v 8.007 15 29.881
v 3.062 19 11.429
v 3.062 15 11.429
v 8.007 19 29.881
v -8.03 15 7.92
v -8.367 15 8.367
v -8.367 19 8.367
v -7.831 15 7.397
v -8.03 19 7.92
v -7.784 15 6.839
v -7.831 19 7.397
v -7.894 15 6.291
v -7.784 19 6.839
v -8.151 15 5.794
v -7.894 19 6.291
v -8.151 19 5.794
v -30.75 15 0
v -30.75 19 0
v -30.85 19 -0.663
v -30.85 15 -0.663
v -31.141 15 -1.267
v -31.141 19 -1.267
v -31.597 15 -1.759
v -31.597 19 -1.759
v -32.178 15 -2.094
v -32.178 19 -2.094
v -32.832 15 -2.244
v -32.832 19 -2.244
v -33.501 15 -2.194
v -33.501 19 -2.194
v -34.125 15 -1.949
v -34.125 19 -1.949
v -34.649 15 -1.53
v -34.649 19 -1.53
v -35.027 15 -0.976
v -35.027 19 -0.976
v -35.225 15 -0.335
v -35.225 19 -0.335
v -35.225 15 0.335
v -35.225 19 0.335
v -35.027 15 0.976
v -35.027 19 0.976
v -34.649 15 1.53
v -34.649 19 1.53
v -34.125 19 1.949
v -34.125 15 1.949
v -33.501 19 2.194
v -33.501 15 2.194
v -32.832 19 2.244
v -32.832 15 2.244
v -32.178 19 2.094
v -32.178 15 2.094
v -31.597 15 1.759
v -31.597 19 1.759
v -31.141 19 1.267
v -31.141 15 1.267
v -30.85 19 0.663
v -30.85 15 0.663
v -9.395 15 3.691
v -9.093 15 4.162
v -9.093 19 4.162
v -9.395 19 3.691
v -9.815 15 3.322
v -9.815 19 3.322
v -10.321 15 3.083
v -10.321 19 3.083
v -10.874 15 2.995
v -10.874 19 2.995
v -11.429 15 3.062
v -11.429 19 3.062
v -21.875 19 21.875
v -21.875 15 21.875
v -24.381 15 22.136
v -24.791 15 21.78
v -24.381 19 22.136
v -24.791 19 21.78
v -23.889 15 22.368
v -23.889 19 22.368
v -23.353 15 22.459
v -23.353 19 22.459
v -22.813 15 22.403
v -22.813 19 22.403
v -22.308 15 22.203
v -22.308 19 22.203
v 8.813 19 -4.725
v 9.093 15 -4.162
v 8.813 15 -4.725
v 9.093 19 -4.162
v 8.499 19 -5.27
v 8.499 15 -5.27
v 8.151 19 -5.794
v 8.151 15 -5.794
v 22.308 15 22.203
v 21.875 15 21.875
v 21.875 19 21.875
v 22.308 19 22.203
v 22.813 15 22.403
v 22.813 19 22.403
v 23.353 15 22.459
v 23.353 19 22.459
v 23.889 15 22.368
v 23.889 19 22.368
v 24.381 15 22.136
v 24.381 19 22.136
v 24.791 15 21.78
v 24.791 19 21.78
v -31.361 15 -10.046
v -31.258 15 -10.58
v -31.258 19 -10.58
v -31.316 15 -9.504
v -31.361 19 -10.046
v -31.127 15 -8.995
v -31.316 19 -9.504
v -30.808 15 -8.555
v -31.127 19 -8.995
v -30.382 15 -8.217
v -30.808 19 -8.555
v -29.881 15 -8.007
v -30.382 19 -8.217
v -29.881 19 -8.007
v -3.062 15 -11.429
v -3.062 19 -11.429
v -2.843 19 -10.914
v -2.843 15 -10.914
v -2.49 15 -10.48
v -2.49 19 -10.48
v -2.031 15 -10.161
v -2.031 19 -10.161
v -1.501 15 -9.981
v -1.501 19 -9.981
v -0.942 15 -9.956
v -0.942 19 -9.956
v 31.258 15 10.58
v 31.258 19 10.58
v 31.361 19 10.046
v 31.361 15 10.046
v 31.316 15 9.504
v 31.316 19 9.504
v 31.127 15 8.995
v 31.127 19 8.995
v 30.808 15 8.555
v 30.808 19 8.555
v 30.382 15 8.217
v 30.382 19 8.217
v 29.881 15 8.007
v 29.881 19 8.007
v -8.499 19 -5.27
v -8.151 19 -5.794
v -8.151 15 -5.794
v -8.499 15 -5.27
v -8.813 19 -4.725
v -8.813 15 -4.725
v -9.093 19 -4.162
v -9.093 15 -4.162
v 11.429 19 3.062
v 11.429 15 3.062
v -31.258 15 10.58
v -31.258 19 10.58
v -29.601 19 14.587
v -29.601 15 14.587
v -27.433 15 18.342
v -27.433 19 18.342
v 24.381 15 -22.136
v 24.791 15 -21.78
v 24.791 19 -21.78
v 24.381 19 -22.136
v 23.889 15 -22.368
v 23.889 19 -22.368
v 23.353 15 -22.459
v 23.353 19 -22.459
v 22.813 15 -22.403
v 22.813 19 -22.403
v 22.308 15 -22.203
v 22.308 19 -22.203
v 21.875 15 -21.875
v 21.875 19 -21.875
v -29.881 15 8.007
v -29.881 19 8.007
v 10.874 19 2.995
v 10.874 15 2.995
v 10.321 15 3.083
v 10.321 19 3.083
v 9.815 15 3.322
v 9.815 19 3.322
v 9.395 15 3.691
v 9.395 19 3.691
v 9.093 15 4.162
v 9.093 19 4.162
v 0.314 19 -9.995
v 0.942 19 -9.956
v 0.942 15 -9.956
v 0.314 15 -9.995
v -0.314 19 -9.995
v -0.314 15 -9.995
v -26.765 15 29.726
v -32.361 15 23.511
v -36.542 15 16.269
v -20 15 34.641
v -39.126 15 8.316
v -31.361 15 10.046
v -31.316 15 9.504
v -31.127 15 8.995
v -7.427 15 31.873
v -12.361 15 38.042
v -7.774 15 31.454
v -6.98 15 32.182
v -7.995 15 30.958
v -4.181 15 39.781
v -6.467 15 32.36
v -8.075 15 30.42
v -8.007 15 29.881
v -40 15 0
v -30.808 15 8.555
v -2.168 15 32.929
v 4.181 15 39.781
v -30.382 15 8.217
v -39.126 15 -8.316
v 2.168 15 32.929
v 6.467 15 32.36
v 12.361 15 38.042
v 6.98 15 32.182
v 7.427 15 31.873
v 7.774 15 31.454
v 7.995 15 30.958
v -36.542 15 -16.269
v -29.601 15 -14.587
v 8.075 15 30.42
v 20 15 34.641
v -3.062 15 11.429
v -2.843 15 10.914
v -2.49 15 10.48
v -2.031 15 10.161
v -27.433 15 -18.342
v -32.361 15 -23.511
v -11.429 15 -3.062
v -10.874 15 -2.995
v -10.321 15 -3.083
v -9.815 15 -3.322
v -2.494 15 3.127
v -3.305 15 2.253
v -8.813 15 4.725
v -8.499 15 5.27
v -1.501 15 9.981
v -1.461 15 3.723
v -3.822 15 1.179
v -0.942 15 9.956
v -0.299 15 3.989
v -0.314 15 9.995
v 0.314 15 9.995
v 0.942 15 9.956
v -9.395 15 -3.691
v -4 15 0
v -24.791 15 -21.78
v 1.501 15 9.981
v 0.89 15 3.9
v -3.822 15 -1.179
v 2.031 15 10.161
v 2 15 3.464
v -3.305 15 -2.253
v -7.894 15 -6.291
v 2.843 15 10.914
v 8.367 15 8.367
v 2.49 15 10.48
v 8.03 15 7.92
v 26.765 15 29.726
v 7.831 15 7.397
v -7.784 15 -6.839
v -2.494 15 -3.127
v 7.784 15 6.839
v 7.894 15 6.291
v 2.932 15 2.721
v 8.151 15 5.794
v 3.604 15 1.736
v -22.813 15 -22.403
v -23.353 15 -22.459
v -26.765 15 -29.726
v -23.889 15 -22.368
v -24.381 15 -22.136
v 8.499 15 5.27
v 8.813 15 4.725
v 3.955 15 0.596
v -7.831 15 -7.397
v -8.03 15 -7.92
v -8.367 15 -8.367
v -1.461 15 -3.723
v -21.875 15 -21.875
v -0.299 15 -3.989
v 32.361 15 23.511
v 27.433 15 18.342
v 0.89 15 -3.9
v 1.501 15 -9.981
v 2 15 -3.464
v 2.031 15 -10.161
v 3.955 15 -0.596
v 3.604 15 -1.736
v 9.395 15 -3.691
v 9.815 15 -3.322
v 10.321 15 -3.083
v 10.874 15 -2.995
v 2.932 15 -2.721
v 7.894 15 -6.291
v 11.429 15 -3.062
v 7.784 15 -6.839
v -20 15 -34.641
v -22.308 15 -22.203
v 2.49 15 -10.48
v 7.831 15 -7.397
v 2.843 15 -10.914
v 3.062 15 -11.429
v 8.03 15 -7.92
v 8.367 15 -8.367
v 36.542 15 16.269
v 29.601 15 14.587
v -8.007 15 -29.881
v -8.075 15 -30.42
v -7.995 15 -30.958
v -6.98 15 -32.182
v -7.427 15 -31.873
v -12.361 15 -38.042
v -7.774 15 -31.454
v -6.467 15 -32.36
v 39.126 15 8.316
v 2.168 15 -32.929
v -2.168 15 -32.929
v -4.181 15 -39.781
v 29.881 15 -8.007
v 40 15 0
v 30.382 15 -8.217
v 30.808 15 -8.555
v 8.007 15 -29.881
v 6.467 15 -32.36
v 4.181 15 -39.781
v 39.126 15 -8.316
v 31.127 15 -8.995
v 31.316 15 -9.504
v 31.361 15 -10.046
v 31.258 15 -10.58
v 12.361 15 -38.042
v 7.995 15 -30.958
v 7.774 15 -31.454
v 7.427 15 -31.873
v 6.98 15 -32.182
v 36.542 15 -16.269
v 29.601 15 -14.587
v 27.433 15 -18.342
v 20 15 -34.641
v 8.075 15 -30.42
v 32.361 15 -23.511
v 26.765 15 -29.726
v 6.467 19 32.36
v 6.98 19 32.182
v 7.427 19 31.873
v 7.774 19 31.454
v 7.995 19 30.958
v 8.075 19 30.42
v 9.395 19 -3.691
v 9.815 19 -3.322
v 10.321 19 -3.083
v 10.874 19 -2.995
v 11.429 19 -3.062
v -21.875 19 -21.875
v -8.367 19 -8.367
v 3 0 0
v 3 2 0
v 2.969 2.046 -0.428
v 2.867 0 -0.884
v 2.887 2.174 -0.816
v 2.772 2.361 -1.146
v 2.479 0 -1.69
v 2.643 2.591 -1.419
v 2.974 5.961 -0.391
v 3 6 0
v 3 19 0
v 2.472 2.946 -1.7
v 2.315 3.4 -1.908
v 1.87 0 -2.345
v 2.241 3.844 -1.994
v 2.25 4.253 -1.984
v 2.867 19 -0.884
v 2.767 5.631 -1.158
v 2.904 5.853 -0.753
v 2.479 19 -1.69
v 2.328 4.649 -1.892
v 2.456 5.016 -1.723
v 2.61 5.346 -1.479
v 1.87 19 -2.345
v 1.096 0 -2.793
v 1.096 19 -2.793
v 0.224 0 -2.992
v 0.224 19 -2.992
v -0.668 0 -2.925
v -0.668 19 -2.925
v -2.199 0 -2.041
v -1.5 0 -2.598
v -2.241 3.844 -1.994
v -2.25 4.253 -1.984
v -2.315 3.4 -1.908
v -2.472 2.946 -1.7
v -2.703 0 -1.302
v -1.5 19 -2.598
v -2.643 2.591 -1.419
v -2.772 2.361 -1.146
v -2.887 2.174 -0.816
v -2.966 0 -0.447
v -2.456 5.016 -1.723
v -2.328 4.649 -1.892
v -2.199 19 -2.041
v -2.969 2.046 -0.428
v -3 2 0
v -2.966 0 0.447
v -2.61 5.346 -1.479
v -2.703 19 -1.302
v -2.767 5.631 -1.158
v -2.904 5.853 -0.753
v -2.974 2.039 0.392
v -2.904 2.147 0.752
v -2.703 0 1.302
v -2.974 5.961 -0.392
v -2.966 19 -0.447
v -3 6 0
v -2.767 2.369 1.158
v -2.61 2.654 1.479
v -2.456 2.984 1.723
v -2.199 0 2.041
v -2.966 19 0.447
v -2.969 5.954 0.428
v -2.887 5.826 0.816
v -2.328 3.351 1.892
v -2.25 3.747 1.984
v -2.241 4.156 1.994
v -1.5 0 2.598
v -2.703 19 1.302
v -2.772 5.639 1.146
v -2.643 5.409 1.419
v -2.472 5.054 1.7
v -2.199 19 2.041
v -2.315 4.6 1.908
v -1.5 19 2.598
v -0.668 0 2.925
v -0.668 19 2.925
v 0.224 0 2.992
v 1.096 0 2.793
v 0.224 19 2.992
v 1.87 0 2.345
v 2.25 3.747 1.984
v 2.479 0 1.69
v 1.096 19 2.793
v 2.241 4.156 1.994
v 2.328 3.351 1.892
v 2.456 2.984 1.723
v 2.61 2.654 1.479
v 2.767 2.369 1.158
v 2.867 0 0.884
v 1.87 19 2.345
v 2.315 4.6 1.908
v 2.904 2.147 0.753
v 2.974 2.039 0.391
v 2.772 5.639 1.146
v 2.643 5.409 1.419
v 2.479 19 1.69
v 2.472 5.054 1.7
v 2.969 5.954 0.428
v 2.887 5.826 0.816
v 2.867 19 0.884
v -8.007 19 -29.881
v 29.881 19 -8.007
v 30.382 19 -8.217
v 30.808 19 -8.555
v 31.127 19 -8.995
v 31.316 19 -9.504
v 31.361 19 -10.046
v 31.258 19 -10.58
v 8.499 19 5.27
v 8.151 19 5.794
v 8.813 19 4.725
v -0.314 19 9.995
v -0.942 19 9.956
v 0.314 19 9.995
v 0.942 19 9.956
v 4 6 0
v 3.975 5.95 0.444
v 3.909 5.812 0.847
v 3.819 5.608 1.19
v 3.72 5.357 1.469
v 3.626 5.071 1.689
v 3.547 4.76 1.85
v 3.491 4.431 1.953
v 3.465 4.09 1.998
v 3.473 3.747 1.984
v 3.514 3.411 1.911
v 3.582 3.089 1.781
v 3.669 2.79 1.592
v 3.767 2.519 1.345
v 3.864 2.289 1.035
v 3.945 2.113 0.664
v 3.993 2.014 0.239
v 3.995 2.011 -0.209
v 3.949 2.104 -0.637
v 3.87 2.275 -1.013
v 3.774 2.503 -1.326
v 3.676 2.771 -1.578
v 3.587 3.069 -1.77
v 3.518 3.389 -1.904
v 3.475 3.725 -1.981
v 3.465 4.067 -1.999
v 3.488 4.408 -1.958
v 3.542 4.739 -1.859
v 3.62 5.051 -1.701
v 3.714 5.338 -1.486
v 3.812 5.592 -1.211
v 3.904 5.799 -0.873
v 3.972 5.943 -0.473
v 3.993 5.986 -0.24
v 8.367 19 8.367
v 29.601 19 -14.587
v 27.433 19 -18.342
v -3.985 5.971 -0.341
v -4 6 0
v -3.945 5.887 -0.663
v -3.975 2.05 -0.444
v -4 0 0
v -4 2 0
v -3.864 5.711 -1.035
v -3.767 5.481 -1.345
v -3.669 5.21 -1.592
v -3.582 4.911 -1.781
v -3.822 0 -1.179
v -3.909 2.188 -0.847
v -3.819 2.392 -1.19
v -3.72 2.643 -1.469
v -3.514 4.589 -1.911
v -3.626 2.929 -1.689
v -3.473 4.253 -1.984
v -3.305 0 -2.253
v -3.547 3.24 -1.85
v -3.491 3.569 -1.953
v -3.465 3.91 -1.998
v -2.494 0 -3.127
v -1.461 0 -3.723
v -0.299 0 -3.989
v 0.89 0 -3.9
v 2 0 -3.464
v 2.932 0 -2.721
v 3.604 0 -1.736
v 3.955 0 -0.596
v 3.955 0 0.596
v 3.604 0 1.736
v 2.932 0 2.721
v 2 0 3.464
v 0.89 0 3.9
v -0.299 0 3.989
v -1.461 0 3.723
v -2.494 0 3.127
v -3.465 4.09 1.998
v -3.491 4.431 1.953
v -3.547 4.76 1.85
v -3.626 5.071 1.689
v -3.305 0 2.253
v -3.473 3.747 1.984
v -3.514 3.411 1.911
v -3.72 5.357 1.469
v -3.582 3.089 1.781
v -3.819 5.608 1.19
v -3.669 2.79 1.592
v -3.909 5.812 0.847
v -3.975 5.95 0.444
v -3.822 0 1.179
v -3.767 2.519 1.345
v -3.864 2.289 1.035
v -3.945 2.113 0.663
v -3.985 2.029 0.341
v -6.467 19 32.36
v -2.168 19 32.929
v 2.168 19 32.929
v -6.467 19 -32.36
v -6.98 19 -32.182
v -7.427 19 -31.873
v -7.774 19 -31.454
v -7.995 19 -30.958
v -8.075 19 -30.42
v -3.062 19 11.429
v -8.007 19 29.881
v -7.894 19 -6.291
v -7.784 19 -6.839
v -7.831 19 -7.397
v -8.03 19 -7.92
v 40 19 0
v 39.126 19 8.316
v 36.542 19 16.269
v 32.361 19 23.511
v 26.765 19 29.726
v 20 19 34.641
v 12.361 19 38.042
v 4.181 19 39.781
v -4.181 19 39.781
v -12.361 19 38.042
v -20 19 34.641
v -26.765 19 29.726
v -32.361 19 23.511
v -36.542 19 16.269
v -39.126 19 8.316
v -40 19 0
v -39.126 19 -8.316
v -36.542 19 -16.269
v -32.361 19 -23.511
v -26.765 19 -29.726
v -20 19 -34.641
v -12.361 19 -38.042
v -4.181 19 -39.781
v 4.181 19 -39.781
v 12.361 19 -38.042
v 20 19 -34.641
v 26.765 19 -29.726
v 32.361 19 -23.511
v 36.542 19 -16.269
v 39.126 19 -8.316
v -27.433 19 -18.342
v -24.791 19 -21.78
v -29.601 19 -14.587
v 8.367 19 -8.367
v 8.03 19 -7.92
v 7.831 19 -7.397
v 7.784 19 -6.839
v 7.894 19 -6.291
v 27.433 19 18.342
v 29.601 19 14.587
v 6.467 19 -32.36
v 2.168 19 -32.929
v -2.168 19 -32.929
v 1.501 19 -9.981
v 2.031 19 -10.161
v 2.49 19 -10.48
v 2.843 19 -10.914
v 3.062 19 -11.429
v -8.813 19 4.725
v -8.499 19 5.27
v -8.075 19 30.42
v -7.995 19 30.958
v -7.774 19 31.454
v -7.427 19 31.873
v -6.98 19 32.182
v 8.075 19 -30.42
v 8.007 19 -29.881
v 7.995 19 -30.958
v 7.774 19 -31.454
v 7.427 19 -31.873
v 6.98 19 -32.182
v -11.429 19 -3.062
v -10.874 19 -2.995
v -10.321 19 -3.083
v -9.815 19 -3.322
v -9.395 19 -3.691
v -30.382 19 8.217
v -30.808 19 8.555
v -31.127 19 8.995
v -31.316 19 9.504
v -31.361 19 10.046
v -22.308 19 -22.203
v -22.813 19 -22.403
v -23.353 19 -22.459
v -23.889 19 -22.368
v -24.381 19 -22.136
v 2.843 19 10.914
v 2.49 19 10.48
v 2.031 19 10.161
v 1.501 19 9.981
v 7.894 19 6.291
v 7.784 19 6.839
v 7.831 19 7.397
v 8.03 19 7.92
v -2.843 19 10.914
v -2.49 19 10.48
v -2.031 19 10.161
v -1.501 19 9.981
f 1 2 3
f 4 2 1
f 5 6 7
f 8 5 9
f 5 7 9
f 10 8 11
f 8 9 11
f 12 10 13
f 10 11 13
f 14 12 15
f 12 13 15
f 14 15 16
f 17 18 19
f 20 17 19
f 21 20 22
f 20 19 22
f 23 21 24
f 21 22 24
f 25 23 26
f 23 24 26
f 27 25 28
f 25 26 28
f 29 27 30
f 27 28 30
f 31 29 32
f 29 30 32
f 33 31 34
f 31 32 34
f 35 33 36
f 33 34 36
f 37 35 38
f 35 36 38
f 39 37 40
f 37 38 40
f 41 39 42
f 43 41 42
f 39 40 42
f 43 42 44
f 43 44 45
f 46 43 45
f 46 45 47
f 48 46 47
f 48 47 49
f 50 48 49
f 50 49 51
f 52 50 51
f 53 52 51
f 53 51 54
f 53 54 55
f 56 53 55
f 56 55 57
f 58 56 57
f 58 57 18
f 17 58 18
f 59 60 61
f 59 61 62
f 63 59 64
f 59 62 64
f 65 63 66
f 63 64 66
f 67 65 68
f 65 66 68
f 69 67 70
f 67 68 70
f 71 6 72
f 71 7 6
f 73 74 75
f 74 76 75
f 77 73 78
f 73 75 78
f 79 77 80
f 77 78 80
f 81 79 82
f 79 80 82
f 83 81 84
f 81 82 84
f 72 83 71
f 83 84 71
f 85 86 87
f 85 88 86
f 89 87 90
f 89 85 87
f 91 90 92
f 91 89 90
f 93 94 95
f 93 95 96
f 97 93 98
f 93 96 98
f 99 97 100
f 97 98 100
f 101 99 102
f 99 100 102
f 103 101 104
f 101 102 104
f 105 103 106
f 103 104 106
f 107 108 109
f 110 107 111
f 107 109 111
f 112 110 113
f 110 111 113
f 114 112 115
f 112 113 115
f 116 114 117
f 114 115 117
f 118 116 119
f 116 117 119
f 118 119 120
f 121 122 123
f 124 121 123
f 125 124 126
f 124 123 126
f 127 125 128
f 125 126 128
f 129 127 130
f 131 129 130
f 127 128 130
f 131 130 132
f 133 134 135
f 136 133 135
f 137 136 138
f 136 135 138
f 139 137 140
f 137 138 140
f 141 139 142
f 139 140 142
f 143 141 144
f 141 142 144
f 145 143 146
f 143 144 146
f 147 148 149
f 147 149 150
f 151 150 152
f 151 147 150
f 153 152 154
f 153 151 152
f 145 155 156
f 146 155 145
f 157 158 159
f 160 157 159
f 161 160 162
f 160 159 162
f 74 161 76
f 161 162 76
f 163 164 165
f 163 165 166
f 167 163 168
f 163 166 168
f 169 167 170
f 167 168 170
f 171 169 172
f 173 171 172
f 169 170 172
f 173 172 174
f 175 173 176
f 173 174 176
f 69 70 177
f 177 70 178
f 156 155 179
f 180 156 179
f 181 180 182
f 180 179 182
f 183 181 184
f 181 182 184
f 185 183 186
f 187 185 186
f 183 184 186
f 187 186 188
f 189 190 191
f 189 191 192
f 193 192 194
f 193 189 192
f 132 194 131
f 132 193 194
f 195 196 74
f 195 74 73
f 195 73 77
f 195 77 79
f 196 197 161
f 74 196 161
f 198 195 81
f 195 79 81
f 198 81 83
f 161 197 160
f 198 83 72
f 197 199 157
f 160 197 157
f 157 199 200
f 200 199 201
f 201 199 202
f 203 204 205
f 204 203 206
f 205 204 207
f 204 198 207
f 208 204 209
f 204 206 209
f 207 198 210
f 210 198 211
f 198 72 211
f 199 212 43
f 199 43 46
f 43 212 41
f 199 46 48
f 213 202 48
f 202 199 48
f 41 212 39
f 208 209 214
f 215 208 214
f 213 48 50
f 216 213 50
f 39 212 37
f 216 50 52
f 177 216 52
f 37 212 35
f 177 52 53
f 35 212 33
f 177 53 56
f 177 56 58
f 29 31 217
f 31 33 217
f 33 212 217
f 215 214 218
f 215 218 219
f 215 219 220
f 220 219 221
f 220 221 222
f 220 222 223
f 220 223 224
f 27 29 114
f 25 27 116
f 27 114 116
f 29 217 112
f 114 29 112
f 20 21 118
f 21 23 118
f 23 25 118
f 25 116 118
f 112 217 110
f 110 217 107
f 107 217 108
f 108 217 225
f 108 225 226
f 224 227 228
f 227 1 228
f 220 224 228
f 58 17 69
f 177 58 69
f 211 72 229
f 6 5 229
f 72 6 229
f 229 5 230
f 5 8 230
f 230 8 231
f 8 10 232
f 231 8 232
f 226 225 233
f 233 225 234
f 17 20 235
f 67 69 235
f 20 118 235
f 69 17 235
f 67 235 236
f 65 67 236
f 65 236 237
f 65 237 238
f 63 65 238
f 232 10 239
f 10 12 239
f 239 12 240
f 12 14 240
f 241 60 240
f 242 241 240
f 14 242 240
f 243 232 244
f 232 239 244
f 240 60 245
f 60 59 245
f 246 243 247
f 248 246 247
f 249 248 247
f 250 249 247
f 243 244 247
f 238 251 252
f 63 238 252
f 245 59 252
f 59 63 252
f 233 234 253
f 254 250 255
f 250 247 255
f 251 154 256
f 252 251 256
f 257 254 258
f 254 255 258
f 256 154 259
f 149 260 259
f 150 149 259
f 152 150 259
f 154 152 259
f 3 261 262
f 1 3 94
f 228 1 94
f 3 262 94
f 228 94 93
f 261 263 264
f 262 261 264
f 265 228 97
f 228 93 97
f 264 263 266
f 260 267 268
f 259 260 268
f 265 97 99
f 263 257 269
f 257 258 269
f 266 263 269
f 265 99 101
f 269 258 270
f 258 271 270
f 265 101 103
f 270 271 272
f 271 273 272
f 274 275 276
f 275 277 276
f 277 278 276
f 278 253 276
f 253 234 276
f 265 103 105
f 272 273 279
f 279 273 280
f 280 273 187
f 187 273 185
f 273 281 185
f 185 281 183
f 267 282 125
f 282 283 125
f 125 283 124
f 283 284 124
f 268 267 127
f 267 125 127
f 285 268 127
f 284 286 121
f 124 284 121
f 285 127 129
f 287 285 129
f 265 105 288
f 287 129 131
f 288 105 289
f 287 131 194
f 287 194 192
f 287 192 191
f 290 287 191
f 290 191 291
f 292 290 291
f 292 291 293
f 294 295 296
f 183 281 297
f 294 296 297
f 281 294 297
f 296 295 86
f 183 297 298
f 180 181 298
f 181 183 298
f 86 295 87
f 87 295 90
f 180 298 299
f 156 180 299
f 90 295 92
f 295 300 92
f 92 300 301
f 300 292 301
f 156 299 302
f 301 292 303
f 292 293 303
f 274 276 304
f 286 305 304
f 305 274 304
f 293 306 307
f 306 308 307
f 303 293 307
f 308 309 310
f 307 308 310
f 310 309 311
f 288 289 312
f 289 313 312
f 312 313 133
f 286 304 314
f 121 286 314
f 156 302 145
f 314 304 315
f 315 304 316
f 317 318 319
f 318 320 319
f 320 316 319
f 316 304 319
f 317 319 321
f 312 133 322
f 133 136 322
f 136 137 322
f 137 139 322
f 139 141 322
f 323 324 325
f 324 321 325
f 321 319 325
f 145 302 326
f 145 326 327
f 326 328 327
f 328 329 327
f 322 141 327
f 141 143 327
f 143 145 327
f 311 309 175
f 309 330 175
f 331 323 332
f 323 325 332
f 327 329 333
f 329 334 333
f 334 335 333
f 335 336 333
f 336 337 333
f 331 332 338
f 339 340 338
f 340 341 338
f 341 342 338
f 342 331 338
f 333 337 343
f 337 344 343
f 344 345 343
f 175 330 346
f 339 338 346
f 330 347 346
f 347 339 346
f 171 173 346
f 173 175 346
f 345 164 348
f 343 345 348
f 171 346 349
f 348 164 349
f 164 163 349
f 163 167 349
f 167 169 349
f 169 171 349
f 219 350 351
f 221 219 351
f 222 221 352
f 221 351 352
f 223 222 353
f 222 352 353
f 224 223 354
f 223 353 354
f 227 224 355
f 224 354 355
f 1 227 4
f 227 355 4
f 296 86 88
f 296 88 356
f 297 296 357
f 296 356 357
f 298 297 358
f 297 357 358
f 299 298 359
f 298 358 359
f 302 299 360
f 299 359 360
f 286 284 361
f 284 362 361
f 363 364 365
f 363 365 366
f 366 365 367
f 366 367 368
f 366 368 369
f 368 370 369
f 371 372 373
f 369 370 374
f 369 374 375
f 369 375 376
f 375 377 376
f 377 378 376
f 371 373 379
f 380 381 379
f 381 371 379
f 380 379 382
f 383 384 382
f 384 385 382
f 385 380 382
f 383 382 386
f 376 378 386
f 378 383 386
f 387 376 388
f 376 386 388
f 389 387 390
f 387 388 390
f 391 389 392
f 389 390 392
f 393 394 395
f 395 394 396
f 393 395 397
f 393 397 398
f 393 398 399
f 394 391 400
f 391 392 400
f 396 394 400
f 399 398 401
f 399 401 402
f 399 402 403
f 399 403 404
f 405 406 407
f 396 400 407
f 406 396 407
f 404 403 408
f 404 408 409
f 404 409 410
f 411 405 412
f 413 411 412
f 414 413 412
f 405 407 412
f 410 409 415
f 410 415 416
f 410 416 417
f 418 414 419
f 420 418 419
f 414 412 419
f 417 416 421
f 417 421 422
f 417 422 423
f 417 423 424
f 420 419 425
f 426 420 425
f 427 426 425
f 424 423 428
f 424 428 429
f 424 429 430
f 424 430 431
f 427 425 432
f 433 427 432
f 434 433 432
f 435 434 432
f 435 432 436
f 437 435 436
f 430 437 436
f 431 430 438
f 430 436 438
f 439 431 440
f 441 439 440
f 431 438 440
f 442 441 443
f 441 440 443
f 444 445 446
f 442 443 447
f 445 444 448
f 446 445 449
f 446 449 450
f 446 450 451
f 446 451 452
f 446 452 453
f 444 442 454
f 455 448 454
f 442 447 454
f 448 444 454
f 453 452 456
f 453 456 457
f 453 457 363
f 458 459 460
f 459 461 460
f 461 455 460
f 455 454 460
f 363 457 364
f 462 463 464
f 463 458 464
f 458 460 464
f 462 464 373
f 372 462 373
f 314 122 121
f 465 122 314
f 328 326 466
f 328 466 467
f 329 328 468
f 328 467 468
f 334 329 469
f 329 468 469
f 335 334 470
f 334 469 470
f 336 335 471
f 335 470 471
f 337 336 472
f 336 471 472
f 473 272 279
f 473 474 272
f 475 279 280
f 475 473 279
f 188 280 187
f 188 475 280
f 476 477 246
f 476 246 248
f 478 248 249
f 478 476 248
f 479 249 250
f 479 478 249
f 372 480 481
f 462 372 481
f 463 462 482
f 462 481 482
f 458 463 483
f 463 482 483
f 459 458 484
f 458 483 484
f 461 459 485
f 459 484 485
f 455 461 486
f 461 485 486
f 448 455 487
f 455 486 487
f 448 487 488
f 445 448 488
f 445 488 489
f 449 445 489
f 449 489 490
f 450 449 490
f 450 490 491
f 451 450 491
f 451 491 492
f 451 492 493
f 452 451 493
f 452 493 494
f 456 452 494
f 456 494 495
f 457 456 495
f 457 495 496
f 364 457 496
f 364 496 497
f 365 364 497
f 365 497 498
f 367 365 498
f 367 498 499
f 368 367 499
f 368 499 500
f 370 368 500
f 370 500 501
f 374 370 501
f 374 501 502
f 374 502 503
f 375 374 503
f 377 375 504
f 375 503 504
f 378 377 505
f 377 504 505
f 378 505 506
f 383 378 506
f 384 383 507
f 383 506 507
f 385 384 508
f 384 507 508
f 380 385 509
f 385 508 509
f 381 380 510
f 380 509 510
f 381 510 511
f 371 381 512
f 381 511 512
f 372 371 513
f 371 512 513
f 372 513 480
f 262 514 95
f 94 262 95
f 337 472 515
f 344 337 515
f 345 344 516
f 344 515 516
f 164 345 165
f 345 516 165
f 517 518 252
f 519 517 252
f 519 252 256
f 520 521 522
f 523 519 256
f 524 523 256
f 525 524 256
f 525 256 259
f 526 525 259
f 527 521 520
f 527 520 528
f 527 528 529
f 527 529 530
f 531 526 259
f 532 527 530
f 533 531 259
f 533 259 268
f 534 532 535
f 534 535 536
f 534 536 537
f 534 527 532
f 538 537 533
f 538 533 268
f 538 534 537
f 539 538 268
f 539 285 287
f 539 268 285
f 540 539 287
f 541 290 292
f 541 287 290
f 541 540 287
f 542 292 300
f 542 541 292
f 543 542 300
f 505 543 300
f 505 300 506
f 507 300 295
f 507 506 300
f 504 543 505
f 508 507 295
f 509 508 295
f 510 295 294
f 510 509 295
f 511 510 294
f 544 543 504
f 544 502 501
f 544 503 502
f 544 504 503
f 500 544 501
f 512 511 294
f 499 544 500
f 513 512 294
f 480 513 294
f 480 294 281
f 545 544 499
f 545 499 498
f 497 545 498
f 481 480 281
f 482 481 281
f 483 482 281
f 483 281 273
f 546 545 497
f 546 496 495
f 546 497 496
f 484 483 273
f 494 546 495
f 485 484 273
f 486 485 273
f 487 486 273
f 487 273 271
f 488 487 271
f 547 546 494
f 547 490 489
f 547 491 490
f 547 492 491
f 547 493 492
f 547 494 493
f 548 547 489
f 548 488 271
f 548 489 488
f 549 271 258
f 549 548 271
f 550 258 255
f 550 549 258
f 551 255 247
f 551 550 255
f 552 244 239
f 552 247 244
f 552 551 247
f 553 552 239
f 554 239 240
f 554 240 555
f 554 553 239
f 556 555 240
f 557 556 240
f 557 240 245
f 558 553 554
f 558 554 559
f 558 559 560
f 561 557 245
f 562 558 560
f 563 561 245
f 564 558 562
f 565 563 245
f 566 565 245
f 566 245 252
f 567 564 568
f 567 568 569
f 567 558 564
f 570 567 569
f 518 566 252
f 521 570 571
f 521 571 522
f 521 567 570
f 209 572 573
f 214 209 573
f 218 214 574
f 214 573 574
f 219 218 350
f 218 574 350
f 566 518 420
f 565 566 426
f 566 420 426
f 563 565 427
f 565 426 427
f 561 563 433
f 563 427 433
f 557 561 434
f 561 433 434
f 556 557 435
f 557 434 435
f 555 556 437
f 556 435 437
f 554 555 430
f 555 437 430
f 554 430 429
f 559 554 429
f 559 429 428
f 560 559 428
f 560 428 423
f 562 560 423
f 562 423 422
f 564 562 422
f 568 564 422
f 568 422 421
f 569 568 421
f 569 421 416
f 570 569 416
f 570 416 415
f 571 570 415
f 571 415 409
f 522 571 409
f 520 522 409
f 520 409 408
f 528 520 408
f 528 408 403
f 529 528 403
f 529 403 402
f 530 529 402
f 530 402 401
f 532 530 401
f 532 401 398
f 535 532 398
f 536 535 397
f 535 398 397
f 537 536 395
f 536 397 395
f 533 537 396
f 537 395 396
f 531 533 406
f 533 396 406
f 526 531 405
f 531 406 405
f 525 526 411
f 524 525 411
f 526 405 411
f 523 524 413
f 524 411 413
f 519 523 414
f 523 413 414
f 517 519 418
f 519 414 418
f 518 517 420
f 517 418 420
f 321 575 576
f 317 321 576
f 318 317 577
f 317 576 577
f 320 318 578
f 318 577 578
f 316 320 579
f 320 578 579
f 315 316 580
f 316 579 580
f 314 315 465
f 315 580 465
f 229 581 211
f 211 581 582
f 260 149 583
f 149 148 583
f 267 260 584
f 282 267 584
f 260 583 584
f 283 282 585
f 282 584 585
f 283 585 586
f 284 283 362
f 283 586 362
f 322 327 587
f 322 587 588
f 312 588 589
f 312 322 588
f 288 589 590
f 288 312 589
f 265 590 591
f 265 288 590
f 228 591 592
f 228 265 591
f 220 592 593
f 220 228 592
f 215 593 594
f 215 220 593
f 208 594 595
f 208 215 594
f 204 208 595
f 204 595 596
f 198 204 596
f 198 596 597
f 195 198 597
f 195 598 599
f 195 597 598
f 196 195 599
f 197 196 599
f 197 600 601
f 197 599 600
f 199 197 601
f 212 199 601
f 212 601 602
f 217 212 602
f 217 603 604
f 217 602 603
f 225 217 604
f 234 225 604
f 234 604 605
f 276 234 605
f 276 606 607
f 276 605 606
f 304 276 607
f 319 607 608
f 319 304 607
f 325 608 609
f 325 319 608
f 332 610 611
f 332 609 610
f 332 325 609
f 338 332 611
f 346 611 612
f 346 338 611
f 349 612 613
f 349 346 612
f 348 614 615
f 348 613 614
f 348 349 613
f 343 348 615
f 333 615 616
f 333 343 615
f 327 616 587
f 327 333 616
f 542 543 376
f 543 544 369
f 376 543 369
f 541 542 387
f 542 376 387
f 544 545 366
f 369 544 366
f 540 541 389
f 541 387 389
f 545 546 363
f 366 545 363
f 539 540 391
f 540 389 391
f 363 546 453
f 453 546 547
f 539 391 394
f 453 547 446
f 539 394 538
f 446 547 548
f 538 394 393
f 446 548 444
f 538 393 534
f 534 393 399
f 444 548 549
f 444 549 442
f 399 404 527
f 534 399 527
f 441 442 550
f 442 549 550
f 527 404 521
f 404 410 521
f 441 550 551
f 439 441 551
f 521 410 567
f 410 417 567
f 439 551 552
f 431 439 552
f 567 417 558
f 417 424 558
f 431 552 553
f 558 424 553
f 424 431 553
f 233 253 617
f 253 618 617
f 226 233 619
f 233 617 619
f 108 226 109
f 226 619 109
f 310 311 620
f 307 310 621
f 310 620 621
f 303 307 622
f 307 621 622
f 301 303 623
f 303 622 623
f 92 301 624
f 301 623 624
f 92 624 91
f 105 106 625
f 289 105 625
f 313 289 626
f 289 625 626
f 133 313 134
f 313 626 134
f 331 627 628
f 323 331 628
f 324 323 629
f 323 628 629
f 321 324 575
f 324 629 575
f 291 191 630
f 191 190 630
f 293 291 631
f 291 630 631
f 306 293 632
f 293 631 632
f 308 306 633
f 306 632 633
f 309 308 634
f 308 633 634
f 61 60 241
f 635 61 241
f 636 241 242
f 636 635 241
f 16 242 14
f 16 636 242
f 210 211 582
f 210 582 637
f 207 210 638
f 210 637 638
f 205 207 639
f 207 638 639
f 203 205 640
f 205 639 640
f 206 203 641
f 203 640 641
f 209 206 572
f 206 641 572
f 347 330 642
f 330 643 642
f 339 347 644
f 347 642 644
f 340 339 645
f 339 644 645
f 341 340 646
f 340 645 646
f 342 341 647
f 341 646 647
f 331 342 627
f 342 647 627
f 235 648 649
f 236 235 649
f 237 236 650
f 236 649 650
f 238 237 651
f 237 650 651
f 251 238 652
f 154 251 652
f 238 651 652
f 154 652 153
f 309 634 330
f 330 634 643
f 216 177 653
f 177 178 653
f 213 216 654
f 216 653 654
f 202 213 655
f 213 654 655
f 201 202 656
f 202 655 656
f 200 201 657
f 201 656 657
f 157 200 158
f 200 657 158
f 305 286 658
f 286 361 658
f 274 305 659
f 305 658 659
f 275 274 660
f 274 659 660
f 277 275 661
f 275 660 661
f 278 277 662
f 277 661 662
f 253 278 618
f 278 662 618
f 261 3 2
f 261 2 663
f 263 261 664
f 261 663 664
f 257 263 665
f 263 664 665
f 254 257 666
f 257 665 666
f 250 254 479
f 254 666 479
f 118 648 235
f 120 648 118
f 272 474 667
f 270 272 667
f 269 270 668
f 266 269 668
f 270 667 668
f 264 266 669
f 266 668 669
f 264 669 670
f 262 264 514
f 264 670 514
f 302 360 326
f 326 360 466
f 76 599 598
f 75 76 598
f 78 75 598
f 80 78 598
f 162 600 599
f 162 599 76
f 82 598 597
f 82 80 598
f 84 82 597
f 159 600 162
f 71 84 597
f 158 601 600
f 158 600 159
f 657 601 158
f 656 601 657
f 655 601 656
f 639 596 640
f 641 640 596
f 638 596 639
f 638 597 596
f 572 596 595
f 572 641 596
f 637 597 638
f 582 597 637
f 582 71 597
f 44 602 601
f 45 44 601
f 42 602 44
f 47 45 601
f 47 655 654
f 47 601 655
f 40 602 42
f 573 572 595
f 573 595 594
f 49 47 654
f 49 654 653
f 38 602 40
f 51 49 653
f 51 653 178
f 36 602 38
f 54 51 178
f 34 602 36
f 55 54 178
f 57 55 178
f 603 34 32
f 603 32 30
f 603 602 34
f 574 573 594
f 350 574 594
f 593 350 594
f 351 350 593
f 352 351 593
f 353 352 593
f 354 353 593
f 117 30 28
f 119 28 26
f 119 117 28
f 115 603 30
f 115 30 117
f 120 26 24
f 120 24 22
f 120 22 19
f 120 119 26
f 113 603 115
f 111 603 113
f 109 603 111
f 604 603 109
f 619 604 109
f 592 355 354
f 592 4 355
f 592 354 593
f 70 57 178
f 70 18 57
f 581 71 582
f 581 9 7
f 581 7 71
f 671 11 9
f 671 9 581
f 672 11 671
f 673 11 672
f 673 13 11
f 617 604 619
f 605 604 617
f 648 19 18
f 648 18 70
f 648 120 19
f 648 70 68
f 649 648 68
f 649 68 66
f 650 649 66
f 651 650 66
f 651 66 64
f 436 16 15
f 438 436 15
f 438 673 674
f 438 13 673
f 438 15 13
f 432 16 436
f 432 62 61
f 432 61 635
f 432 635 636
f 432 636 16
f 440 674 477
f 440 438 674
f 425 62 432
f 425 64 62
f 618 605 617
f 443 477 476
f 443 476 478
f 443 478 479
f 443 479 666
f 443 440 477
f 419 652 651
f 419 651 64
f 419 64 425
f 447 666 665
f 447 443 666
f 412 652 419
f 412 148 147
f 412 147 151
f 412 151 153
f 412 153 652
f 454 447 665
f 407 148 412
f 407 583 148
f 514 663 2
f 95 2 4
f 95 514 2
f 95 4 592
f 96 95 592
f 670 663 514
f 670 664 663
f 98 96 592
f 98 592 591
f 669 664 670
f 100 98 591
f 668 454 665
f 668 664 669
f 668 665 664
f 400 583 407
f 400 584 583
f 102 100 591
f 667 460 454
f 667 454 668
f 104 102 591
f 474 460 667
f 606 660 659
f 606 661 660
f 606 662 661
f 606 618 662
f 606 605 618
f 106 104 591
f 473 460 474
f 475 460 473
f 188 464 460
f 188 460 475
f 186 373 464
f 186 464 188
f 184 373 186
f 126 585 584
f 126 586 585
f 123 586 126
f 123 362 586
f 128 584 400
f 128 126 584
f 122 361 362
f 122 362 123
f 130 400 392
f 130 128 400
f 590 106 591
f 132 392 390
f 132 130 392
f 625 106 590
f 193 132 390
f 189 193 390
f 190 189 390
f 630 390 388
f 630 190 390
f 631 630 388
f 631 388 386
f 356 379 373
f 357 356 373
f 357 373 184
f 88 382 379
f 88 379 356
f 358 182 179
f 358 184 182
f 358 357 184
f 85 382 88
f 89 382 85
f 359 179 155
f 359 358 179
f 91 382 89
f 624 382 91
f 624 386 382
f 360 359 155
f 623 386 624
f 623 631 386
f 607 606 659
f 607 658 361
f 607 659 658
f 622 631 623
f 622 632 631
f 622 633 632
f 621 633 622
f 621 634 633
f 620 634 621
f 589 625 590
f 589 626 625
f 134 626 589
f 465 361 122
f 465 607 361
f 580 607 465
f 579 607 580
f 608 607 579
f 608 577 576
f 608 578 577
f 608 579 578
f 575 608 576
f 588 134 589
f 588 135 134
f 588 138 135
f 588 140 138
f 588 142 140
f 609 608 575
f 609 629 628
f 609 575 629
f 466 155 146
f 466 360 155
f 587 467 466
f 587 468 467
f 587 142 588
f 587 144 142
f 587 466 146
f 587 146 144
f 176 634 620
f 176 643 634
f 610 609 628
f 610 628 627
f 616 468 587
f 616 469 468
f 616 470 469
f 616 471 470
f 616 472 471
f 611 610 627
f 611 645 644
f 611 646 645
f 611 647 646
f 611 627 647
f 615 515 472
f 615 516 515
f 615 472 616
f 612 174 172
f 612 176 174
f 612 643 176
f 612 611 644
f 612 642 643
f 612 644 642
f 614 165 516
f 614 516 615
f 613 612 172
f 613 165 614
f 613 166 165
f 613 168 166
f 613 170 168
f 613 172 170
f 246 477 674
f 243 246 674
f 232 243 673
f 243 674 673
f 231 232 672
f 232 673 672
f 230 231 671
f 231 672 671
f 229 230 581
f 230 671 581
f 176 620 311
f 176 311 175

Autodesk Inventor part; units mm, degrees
ref_plane "YZ Plane" through (0, 0, 0) normal (1, 0, 0) x (0, 1, 0)
ref_plane "XZ Plane" through (0, 0, 0) normal (0, 1, 0) x (-1, 0, 0)
ref_plane "XY Plane" through (0, 0, 0) normal (0, 0, 1) x (1, 0, 0)
sketch "Sketch1" plane through (0, 0, 0) normal (0, 1, 0) x (-1, 0, 0)
  circle A0 centre (0, 0) radius 4
  dimension "d0" = 8
extrude "Extrusion1" add sketch "Sketch1" along normal blind 15
sketch "Sketch2" plane through (0, 15, 0) normal (0, 1, 0) x (1, 0, 0)
  circle A0 centre (0, 0) radius 3
  dimension "d3" = 6
extrude "Extrusion2" cut sketch "Sketch2" against normal blind 13
sketch "Sketch3" plane through (0, 0, 0) normal (1, 0, 0) x (0, 1, 0)
  line L0 (15, -4) -> (15, 4) projected
  circle A0 centre (4, 0) radius 2
  line L1 (0, -4) -> (0, 4) projected
  point P0 (0, 0)
  dimension "d8" = 4
  dimension "d9" = 4
extrude "Extrusion3" cut sketch "Sketch3" against normal through all both and the other way through all
sketch "Sketch9" plane through (0, 15, 0) normal (0, 1, 0) x (1, 0, 0)
  circle A0 centre (0, 0) radius 40
  dimension "d47" = 80
extrude "Extrusion8" add sketch "Sketch9" along normal blind 4
sketch "Sketch10" plane through (0, 19, 0) normal (0, 1, 0) x (1, 0, 0)
  circle A0 centre (0, 0) radius 3
  circle A1 centre (-33, 0) radius 2.25
  arc A2 (3, 0) -> (-3, 0) centre (0, 0) ccw projected
  line L0 (0, 0) -> (-40, 0)
  circle A3 centre (0, 0) radius 4 projected
  arc A4 (-31.2581, -10.5797) -> (-24.7914, -21.7805) centre (0, 0) ccw
  arc A5 (-29.8813, -8.0067) -> (-31.2581, -10.5797) centre (-29.3637, -9.9385) ccw
  arc A6 (-24.7914, -21.7805) -> (-21.8746, -21.8746) centre (-23.2889, -20.4604) ccw
  arc A7 (-9.0928, -4.1619) -> (-8.1507, -5.7937) centre (0, 0) ccw
  line L1 (-8.3666, -8.3666) -> (-21.8746, -21.8746)
  line L2 (-11.429, -3.0624) -> (-29.8813, -8.0067)
  arc A8 (-8.3666, -8.3666) -> (-8.1507, -5.7937) centre (-9.7808, -6.9524) ccw
  arc A9 (-9.0928, -4.1619) -> (-11.429, -3.0624) centre (-10.9114, -4.9942) ccw
  arc A10 (-6.4667, -32.3602) -> (6.4667, -32.3602) centre (0, 0) ccw
  line L3 (-3.0624, -11.429) -> (-8.0067, -29.8813)
  arc A11 (-0.9421, -9.9555) -> (-3.0624, -11.429) centre (-1.1305, -11.9466) ccw
  line L4 (3.0624, -11.429) -> (8.0067, -29.8813)
  arc A12 (-0.9421, -9.9555) -> (0.9421, -9.9555) centre (0, 0) ccw
  arc A13 (3.0624, -11.429) -> (0.9421, -9.9555) centre (1.1305, -11.9466) ccw
  arc A14 (6.4667, -32.3602) -> (8.0067, -29.8813) centre (6.0748, -30.399) ccw
  arc A15 (-8.0067, -29.8813) -> (-6.4667, -32.3602) centre (-6.0748, -30.399) ccw
  arc A16 (24.7914, -21.7805) -> (31.2581, -10.5797) centre (0, 0) ccw
  line L5 (8.3666, -8.3666) -> (21.8746, -21.8746)
  arc A17 (8.1507, -5.7937) -> (8.3666, -8.3666) centre (9.7808, -6.9524) ccw
  line L6 (11.429, -3.0624) -> (29.8813, -8.0067)
  arc A18 (8.1507, -5.7937) -> (9.0928, -4.1619) centre (0, 0) ccw
  arc A19 (11.429, -3.0624) -> (9.0928, -4.1619) centre (10.9114, -4.9942) ccw
  arc A20 (31.2581, -10.5797) -> (29.8813, -8.0067) centre (29.3637, -9.9385) ccw
  arc A21 (21.8746, -21.8746) -> (24.7914, -21.7805) centre (23.2889, -20.4604) ccw
  arc A22 (31.2581, 10.5797) -> (24.7914, 21.7805) centre (0, 0) ccw
  line L7 (11.429, 3.0624) -> (29.8813, 8.0067)
  arc A23 (9.0928, 4.1619) -> (11.429, 3.0624) centre (10.9114, 4.9942) ccw
  line L8 (8.3666, 8.3666) -> (21.8746, 21.8746)
  arc A24 (9.0928, 4.1619) -> (8.1507, 5.7937) centre (0, 0) ccw
  arc A25 (8.3666, 8.3666) -> (8.1507, 5.7937) centre (9.7808, 6.9524) ccw
  arc A26 (24.7914, 21.7805) -> (21.8746, 21.8746) centre (23.2889, 20.4604) ccw
  arc A27 (29.8813, 8.0067) -> (31.2581, 10.5797) centre (29.3637, 9.9385) ccw
  arc A28 (6.4667, 32.3602) -> (-6.4667, 32.3602) centre (0, 0) ccw
  line L9 (3.0624, 11.429) -> (8.0067, 29.8813)
  arc A29 (0.9421, 9.9555) -> (3.0624, 11.429) centre (1.1305, 11.9466) ccw
  line L10 (-3.0624, 11.429) -> (-8.0067, 29.8813)
  arc A30 (0.9421, 9.9555) -> (-0.9421, 9.9555) centre (0, 0) ccw
  arc A31 (-3.0624, 11.429) -> (-0.9421, 9.9555) centre (-1.1305, 11.9466) ccw
  arc A32 (-6.4667, 32.3602) -> (-8.0067, 29.8813) centre (-6.0748, 30.399) ccw
  arc A33 (8.0067, 29.8813) -> (6.4667, 32.3602) centre (6.0748, 30.399) ccw
  arc A34 (-24.7914, 21.7805) -> (-31.2581, 10.5797) centre (0, 0) ccw
  line L11 (-8.3666, 8.3666) -> (-21.8746, 21.8746)
  arc A35 (-8.1507, 5.7937) -> (-8.3666, 8.3666) centre (-9.7808, 6.9524) ccw
  line L12 (-11.429, 3.0624) -> (-29.8813, 8.0067)
  arc A36 (-8.1507, 5.7937) -> (-9.0928, 4.1619) centre (0, 0) ccw
  arc A37 (-11.429, 3.0624) -> (-9.0928, 4.1619) centre (-10.9114, 4.9942) ccw
  arc A38 (-31.2581, 10.5797) -> (-29.8813, 8.0067) centre (-29.3637, 9.9385) ccw
  arc A39 (-21.8746, 21.8746) -> (-24.7914, 21.7805) centre (-23.2889, 20.4604) ccw
  point P0 (-31.8756, -8.541)
  point P1 (-23.3345, -23.3345)
  point P2 (-9.6593, -2.5882)
  point P3 (-7.0711, -7.0711)
  dimension "d54" = 4.5
  dimension "d62" = 2
  dimension "d63" = 2
  dimension "d66" = 360
extrude "Extrusion9" cut sketch "Sketch10" against normal through all contours A0 | A1 L0 | L0 A1 | A5 L2 A9 A7 A8 L1 A6 A4 | A15 L3 A11 A12 A13 L4 A14 A10 | A21 L5 A17 A18 A19 L6 A20 A16 | A27 L7 A23 A24 A25 L8 A26 A22 | A33 L9 A29 A30 A31 L10 A32 A28 | A39 L11 A35 A36 A37 L12 A38 A34
properties part number "trục quay"
